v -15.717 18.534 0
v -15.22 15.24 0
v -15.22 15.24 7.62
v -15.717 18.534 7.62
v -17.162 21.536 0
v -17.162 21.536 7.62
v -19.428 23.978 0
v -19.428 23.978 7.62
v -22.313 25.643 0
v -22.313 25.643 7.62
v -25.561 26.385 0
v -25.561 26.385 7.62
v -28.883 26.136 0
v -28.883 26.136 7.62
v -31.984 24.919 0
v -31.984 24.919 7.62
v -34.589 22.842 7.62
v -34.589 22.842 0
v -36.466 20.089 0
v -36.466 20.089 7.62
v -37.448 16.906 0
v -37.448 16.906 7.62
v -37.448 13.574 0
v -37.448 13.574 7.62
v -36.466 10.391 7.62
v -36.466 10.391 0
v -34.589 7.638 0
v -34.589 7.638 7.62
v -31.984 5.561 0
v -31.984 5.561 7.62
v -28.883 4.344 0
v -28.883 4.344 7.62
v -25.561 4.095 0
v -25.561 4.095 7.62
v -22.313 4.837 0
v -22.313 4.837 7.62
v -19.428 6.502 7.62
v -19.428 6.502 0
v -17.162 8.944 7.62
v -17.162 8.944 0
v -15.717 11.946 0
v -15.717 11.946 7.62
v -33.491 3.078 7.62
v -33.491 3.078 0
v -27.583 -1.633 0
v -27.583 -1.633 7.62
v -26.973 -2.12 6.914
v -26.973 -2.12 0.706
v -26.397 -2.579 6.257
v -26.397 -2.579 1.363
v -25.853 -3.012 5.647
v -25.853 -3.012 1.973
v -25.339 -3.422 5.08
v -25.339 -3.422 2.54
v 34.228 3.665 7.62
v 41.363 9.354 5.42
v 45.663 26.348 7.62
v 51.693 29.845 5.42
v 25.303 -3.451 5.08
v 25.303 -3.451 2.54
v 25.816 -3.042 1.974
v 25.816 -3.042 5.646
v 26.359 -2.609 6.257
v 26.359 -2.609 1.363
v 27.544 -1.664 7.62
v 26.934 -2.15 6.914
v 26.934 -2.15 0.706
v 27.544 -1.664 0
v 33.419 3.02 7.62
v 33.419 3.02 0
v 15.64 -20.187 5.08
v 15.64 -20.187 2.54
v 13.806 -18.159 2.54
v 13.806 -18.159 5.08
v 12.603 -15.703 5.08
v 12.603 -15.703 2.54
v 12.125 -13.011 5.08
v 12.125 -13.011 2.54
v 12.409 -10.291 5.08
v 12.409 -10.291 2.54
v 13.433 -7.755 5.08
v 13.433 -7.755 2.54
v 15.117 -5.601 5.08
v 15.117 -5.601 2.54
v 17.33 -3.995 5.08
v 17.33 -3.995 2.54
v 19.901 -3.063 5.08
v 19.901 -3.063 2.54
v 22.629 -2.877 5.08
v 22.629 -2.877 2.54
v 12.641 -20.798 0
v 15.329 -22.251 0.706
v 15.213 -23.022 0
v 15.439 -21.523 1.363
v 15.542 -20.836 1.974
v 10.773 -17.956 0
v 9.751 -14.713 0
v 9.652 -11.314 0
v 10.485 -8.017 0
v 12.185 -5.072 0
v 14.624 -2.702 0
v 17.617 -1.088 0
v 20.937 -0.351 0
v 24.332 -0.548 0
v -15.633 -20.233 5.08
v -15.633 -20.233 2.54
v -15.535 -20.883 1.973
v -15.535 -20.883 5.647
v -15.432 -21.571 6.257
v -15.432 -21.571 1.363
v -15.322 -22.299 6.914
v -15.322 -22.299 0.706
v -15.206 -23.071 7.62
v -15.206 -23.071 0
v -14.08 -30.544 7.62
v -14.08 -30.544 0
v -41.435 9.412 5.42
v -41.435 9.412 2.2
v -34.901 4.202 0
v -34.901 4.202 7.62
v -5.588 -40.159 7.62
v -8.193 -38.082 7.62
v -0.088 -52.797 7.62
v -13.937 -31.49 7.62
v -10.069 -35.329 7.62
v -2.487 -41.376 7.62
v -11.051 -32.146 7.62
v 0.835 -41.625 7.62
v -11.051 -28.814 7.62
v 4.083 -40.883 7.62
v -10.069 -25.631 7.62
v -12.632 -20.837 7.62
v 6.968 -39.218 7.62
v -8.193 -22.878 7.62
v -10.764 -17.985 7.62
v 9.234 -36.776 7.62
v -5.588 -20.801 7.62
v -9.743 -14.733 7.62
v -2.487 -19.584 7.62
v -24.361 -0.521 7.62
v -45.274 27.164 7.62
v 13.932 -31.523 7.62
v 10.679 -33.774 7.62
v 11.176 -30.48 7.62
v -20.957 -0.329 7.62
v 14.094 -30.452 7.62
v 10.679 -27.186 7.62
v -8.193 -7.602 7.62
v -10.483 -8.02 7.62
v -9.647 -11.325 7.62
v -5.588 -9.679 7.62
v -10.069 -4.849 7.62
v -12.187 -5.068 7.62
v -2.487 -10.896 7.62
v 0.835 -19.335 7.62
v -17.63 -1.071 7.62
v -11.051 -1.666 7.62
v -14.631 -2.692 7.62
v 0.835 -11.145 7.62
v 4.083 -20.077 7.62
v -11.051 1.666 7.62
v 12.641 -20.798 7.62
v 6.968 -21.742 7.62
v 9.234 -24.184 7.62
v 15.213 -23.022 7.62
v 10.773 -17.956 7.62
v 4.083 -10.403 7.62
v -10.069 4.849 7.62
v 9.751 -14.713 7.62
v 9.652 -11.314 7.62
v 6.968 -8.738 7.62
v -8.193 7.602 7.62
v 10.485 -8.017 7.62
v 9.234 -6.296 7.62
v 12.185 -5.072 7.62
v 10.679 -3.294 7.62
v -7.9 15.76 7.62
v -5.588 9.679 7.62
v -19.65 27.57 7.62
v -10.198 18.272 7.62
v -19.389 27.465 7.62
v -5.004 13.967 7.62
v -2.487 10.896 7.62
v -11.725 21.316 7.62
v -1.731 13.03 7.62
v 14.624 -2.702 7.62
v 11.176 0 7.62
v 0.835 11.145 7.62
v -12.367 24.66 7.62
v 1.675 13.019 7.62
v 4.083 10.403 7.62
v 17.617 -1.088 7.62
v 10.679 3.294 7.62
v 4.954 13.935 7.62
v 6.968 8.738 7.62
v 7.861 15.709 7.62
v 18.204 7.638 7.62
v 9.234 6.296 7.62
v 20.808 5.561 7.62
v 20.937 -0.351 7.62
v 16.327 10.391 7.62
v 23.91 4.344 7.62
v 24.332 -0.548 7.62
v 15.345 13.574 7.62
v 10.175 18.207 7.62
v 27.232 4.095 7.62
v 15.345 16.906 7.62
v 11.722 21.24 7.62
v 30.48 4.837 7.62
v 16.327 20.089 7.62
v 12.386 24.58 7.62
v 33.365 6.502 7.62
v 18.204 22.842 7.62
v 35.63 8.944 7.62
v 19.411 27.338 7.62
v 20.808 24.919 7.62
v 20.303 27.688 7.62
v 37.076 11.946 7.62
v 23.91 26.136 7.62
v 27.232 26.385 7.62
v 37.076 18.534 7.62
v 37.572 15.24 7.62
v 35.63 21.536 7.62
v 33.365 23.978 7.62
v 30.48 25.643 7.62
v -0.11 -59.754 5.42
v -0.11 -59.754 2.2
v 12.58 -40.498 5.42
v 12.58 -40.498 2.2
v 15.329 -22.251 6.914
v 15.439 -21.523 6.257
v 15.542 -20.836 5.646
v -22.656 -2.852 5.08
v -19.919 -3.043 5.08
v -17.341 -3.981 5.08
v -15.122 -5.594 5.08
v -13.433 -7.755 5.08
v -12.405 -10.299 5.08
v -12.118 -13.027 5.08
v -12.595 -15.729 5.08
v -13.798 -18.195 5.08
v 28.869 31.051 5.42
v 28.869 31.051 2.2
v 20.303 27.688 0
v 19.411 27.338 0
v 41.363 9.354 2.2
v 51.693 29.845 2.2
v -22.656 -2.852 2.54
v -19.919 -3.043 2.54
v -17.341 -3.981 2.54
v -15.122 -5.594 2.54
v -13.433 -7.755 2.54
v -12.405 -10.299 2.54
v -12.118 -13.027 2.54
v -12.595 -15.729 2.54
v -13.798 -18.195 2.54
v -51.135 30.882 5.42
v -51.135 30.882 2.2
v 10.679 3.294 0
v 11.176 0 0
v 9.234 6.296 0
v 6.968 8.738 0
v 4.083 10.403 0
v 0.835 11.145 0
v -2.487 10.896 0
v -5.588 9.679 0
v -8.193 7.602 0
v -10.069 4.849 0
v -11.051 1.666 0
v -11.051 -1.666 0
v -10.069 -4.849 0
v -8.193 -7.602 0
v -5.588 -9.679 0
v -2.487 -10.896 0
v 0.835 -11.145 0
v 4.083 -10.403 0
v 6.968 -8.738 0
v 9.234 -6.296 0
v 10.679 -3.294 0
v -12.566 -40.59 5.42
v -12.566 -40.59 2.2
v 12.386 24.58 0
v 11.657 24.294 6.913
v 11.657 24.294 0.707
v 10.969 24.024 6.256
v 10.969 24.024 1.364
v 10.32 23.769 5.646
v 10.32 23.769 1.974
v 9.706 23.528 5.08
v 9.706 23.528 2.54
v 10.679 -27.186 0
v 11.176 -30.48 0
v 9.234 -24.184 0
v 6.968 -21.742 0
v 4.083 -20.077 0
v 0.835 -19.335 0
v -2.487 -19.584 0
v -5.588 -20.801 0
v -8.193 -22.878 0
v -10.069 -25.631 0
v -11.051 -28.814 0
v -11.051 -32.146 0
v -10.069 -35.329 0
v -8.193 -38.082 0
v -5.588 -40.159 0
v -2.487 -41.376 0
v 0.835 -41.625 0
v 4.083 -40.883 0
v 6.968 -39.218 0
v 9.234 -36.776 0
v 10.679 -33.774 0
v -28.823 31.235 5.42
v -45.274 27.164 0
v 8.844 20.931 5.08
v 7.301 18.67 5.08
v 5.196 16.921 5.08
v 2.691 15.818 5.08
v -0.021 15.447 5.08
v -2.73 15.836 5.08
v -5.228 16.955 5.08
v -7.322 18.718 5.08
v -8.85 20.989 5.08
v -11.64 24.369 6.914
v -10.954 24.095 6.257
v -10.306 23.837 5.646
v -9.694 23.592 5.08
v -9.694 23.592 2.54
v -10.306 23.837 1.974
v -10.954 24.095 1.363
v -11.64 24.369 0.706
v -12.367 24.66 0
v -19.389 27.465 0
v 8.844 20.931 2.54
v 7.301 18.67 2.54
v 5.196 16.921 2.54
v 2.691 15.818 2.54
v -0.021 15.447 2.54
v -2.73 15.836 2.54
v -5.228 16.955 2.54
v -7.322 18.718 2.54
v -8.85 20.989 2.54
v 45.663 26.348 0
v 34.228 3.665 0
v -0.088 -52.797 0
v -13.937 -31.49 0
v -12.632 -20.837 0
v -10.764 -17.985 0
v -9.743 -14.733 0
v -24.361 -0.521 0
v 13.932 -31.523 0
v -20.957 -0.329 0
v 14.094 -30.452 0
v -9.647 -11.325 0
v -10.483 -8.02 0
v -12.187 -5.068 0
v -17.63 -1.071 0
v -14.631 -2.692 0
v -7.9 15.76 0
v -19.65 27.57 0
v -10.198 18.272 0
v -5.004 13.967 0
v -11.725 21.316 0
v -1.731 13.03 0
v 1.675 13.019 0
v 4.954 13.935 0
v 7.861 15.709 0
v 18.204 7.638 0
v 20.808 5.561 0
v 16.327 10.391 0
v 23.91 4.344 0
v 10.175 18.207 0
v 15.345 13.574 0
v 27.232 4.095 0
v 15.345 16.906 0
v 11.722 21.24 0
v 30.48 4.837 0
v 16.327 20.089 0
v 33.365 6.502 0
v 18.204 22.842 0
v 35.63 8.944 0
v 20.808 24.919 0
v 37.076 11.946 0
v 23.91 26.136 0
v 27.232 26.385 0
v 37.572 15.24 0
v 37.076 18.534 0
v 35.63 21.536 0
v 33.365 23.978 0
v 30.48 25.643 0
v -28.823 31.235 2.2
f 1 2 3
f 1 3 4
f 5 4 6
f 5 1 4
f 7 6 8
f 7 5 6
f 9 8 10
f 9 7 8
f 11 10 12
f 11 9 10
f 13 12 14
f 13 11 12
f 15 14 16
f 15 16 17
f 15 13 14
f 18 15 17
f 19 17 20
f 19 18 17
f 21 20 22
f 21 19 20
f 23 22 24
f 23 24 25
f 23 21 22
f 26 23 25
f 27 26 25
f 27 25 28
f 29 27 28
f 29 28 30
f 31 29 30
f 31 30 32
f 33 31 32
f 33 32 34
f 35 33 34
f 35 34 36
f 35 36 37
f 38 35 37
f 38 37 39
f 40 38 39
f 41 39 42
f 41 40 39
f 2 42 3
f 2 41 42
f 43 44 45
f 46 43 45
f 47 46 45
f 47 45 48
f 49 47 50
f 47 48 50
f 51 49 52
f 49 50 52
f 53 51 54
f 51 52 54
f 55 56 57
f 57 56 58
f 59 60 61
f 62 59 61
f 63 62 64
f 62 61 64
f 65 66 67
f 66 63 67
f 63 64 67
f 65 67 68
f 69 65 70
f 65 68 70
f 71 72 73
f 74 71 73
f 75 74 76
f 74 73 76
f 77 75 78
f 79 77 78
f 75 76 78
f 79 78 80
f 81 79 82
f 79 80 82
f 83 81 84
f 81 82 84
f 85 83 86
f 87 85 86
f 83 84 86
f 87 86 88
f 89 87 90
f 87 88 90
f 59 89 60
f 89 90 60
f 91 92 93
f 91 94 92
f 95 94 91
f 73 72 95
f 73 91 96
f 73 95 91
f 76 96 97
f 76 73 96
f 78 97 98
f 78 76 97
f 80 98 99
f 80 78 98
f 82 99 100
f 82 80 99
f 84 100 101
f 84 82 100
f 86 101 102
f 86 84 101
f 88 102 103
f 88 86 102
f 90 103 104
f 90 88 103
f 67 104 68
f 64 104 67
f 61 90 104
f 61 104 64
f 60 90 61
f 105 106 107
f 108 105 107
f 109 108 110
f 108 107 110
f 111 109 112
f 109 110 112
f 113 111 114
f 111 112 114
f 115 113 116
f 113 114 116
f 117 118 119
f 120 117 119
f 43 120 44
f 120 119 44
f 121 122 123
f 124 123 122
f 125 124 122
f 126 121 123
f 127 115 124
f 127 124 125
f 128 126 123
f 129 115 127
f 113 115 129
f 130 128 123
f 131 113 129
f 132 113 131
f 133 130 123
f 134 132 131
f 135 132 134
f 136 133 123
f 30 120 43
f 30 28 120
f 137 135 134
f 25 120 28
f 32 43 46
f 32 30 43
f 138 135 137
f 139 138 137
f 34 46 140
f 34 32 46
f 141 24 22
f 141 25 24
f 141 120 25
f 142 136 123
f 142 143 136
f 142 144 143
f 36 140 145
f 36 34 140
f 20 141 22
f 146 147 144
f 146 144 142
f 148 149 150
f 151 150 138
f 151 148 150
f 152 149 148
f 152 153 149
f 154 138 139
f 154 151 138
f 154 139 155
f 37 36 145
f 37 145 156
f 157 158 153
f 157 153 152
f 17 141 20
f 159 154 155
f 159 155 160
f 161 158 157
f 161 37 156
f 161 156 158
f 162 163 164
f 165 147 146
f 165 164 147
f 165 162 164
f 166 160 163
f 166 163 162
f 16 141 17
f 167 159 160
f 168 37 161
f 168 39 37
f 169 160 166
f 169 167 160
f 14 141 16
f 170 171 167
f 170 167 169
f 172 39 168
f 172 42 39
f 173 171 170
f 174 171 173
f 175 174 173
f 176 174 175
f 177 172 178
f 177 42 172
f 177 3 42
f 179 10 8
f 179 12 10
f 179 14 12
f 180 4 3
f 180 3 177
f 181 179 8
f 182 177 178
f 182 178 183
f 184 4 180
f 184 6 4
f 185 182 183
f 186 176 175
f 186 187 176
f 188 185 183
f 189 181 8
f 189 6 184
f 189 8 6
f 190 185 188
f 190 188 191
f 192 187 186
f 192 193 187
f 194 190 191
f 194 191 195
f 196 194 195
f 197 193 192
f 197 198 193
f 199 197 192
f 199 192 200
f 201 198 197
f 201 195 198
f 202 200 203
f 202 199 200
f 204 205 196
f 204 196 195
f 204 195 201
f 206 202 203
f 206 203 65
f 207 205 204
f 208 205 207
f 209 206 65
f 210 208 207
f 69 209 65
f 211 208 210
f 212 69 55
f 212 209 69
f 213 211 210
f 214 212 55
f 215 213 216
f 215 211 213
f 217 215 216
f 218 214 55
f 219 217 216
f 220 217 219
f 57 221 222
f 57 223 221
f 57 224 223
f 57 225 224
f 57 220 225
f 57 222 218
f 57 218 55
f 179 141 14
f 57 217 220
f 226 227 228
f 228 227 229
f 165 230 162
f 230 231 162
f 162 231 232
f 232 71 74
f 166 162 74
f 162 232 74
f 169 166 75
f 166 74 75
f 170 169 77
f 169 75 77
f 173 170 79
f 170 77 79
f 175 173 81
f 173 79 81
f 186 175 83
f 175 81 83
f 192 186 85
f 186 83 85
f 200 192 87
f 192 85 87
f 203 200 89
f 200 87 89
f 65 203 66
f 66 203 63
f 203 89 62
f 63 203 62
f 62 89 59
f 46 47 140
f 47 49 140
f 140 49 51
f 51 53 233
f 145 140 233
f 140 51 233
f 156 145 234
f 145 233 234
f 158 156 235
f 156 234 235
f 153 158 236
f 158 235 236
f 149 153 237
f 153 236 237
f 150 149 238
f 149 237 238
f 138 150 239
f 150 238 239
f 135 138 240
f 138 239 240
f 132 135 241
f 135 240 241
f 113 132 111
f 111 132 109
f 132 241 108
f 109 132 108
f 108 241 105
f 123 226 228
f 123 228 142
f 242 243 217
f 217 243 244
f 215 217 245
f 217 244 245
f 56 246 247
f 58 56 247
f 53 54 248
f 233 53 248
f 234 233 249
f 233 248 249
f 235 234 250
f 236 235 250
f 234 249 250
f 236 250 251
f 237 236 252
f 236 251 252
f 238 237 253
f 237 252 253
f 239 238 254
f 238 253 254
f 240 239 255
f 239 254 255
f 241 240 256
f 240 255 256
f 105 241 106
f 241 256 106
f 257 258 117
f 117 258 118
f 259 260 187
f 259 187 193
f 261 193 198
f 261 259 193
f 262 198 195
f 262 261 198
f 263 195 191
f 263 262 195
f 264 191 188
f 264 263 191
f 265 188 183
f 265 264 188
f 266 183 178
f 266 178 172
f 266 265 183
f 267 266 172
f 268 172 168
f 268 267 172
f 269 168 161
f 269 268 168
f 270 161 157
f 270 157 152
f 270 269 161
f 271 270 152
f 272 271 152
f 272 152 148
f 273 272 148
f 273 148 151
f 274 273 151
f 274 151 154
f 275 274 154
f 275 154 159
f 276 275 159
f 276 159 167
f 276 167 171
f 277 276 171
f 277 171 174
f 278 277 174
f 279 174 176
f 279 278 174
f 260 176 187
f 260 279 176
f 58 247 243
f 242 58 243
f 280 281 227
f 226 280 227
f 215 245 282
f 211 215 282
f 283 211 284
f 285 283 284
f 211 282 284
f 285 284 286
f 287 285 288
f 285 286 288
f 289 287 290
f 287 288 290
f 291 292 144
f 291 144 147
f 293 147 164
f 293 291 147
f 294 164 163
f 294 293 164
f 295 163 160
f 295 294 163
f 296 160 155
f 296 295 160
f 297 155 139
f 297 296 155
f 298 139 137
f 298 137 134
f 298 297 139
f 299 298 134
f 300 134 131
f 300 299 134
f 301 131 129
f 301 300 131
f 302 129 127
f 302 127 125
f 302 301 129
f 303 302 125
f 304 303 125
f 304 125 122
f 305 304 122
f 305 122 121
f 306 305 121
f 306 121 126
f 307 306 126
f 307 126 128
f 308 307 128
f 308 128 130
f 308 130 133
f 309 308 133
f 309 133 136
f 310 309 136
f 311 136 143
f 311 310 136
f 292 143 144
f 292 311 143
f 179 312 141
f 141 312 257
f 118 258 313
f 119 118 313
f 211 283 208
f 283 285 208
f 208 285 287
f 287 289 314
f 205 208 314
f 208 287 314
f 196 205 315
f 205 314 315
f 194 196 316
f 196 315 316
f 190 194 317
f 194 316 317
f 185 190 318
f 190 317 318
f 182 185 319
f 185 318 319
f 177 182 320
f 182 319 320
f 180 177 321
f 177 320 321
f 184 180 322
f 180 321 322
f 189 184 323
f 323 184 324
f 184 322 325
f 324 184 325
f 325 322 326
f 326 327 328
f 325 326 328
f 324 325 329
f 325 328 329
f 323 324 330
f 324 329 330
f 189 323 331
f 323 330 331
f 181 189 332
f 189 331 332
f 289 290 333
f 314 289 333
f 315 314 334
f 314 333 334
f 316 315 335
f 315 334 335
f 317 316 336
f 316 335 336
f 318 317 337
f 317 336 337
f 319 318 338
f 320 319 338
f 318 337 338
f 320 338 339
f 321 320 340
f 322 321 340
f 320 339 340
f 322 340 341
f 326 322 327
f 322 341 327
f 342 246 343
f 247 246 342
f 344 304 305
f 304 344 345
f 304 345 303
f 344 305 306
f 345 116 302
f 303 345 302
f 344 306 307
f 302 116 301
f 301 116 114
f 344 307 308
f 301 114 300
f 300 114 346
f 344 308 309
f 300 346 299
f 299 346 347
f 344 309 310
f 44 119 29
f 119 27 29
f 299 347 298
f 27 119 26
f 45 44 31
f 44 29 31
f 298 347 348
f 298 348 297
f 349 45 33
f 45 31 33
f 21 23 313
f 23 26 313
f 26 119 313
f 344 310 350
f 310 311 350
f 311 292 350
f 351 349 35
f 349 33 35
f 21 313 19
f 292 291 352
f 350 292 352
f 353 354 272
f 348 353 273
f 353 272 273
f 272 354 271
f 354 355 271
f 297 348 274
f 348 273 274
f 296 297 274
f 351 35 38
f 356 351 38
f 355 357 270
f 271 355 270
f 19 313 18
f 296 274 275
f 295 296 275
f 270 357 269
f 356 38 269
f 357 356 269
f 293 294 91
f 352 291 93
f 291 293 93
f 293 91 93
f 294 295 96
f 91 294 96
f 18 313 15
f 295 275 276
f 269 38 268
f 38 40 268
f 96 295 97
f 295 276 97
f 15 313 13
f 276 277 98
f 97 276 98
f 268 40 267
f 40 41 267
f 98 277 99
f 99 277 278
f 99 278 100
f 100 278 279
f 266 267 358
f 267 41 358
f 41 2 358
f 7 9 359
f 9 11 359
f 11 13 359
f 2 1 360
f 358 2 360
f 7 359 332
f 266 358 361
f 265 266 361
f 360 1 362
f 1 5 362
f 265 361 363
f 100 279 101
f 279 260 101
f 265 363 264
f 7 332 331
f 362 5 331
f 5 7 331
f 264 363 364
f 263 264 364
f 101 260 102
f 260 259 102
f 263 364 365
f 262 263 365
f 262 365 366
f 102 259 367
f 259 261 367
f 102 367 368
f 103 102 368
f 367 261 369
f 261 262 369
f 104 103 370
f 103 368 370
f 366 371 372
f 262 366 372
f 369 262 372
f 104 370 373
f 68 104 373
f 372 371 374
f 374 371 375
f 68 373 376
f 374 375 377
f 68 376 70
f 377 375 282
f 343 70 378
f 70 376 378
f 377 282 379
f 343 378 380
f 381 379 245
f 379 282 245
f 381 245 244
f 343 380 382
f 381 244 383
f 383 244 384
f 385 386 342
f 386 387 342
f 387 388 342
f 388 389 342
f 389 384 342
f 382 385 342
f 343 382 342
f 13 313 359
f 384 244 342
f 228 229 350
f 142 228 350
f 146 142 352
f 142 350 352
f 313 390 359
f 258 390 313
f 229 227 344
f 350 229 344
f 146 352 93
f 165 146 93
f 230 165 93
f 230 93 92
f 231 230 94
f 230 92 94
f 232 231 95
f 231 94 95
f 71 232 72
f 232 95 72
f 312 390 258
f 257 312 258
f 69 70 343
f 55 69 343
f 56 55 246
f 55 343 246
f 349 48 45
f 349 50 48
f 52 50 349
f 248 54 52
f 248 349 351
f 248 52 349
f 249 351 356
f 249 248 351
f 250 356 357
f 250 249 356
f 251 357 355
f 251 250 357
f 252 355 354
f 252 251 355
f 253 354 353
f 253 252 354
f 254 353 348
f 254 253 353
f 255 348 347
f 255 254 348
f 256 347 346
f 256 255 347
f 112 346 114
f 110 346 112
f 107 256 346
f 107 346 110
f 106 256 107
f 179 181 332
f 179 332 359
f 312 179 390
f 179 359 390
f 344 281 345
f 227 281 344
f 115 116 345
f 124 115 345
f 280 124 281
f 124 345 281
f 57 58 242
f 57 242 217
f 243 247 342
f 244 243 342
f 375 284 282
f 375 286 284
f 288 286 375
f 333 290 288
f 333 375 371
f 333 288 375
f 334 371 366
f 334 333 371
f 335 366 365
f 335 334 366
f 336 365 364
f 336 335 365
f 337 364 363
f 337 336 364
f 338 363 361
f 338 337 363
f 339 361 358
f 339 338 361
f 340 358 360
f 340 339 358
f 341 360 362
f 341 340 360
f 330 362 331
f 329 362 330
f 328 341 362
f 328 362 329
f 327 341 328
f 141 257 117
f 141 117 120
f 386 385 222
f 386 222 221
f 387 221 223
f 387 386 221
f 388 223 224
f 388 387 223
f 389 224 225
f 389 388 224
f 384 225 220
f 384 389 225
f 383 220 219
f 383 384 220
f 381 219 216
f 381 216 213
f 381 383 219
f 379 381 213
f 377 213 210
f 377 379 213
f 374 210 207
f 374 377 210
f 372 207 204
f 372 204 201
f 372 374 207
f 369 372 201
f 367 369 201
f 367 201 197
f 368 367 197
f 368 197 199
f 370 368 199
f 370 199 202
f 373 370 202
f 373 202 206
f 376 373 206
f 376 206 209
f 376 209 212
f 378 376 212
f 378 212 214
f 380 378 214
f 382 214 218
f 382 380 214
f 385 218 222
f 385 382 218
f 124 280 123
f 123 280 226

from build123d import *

# Parameters (mm, degrees)
F0_R       = 11.176
F1_DEPTH   = 7.62
F2_SIZE2   = 2.1997045256
F2_SIZE    = 3.81
F2_2_SIZE2 = 2.1997045256
F2_2_SIZE  = 3.81
F3_SIZE2   = 2.1997045256
F3_SIZE    = 3.81
F4_SIZE    = 2.54


# Not quite as in the source:
# - a feature names something its author has since deleted; it is built from what else it names


with BuildPart() as f1:
    # F0 (on Top) → F1 (new body)
    with BuildSketch(Plane.XY):
        with BuildLine():
            ThreePointArc((9.7057271537, 23.5283748909), (-0.0208649872, 15.4470615517), (-9.6943160077, 23.5919105566))
            Line((-9.6943160077, 23.5919105566), (-19.3886320155, 27.4654462223))
            Line((-19.3886320155, 27.4654462223), (-28.8233609262, 31.2352592656))
            Line((-28.8233609262, 31.2352592656), (-51.1347862104, 30.8821881406))
            Line((-51.1347862104, 30.8821881406), (-41.4352900784, 9.4122263494))
            Line((-41.4352900784, 9.4122263494), (-33.4914395336, 3.0781251091))
            Line((-33.4914395336, 3.0781251091), (-25.3390191684, -3.4222811682))
            ThreePointArc((-25.3390191684, -3.4222811682), (-13.4326493579, -7.7553437227), (-15.6332920147, -20.2330937227))
            Line((-15.6332920147, -20.2330937227), (-14.0799852263, -30.5435))
            Line((-14.0799852263, -30.5435), (-12.5664179144, -40.5901269958))
            Line((-12.5664179144, -40.5901269958), (-0.1099852263, -59.7535))
            Line((-0.1099852263, -59.7535), (12.5802445818, -40.4983495315))
            Line((12.5802445818, -40.4983495315), (14.0938118937, -30.4517225357))
            Line((14.0938118937, -30.4517225357), (15.6402053484, -20.1872049906))
            ThreePointArc((15.6402053484, -20.1872049906), (13.4326493579, -7.7553437227), (25.3027350274, -3.4512126568))
            Line((25.3027350274, -3.4512126568), (33.4188712518, 3.0202621318))
            Line((33.4188712518, 3.0202621318), (41.3627217965, 9.3543633721))
            Line((41.3627217965, 9.3543633721), (51.6930563519, 29.845))
            Line((51.6930563519, 29.845), (28.868872164, 31.0509006464))
            Line((28.868872164, 31.0509006464), (19.4114543073, 27.3383748909))
            Line((19.4114543073, 27.3383748909), (9.7057271537, 23.5283748909))
        make_face()
        with Locations((0, -30.48)):
            Circle(F0_R, mode=Mode.SUBTRACT)
        Circle(F0_R, mode=Mode.SUBTRACT)
        with Locations((-26.3964543073, 15.24)):
            Circle(F0_R, mode=Mode.SUBTRACT)
        with Locations((26.3964543073, 15.24)):
            Circle(F0_R, mode=Mode.SUBTRACT)
    extrude(amount=F1_DEPTH)

    # F2
    f2_edges = [f1.edges().sort_by_distance(p)[0] for p in [
        (-46.285038, 20.147207, 7.62),
        (-39.979074, 31.058724, 7.62),
        (40.280964, 30.44795, 7.62),
        (46.527889, 19.599682, 7.62),
        (6.23513, -50.125925, 7.62),
        (-6.338202, -50.171813, 7.62),
    ]]
    f2_side = f1.faces().sort_by_distance((19.789019, 26.011541, 7.62))[0]
    chamfer(f2_edges, length=F2_SIZE, length2=F2_SIZE2, reference=f2_side)

    # F2#2
    f2_2_edges = [f1.edges().sort_by_distance(p)[0] for p in [
        (-46.285038, 20.147207, 0),
        (46.527889, 19.599682, 0),
        (-39.979074, 31.058724, 0),
    ]]
    f2_2_side = f1.faces().sort_by_distance((19.789019, 26.011541, 0))[0]
    chamfer(f2_2_edges, length=F2_2_SIZE, length2=F2_2_SIZE2, reference=f2_2_side)

    # F3
    f3_edges = [f1.edges().sort_by_distance(p)[0] for p in [
        (-6.338202, -50.171813, 0),
        (6.23513, -50.125925, 0),
        (38.202915, 30.557743, 0),
    ]]
    f3_side = f1.faces().sort_by_distance((-15.154017, 24.375179, 0))[0]
    chamfer(f3_edges, length=F3_SIZE, length2=F3_SIZE2, reference=f3_side)

    # F4
    f4_edges = [f1.edges().sort_by_distance(p)[0] for p in [
        (-0.020865, 15.447062, 7.62),
        (13.432649, -7.755344, 7.62),
        (-13.432649, -7.755344, 7.62),
        (-13.432649, -7.755344, 0),
        (-0.020865, 15.447062, 0),
        (13.432649, -7.755344, 0),
    ]]
    chamfer(f4_edges, length=F4_SIZE)


solid = f1.part
